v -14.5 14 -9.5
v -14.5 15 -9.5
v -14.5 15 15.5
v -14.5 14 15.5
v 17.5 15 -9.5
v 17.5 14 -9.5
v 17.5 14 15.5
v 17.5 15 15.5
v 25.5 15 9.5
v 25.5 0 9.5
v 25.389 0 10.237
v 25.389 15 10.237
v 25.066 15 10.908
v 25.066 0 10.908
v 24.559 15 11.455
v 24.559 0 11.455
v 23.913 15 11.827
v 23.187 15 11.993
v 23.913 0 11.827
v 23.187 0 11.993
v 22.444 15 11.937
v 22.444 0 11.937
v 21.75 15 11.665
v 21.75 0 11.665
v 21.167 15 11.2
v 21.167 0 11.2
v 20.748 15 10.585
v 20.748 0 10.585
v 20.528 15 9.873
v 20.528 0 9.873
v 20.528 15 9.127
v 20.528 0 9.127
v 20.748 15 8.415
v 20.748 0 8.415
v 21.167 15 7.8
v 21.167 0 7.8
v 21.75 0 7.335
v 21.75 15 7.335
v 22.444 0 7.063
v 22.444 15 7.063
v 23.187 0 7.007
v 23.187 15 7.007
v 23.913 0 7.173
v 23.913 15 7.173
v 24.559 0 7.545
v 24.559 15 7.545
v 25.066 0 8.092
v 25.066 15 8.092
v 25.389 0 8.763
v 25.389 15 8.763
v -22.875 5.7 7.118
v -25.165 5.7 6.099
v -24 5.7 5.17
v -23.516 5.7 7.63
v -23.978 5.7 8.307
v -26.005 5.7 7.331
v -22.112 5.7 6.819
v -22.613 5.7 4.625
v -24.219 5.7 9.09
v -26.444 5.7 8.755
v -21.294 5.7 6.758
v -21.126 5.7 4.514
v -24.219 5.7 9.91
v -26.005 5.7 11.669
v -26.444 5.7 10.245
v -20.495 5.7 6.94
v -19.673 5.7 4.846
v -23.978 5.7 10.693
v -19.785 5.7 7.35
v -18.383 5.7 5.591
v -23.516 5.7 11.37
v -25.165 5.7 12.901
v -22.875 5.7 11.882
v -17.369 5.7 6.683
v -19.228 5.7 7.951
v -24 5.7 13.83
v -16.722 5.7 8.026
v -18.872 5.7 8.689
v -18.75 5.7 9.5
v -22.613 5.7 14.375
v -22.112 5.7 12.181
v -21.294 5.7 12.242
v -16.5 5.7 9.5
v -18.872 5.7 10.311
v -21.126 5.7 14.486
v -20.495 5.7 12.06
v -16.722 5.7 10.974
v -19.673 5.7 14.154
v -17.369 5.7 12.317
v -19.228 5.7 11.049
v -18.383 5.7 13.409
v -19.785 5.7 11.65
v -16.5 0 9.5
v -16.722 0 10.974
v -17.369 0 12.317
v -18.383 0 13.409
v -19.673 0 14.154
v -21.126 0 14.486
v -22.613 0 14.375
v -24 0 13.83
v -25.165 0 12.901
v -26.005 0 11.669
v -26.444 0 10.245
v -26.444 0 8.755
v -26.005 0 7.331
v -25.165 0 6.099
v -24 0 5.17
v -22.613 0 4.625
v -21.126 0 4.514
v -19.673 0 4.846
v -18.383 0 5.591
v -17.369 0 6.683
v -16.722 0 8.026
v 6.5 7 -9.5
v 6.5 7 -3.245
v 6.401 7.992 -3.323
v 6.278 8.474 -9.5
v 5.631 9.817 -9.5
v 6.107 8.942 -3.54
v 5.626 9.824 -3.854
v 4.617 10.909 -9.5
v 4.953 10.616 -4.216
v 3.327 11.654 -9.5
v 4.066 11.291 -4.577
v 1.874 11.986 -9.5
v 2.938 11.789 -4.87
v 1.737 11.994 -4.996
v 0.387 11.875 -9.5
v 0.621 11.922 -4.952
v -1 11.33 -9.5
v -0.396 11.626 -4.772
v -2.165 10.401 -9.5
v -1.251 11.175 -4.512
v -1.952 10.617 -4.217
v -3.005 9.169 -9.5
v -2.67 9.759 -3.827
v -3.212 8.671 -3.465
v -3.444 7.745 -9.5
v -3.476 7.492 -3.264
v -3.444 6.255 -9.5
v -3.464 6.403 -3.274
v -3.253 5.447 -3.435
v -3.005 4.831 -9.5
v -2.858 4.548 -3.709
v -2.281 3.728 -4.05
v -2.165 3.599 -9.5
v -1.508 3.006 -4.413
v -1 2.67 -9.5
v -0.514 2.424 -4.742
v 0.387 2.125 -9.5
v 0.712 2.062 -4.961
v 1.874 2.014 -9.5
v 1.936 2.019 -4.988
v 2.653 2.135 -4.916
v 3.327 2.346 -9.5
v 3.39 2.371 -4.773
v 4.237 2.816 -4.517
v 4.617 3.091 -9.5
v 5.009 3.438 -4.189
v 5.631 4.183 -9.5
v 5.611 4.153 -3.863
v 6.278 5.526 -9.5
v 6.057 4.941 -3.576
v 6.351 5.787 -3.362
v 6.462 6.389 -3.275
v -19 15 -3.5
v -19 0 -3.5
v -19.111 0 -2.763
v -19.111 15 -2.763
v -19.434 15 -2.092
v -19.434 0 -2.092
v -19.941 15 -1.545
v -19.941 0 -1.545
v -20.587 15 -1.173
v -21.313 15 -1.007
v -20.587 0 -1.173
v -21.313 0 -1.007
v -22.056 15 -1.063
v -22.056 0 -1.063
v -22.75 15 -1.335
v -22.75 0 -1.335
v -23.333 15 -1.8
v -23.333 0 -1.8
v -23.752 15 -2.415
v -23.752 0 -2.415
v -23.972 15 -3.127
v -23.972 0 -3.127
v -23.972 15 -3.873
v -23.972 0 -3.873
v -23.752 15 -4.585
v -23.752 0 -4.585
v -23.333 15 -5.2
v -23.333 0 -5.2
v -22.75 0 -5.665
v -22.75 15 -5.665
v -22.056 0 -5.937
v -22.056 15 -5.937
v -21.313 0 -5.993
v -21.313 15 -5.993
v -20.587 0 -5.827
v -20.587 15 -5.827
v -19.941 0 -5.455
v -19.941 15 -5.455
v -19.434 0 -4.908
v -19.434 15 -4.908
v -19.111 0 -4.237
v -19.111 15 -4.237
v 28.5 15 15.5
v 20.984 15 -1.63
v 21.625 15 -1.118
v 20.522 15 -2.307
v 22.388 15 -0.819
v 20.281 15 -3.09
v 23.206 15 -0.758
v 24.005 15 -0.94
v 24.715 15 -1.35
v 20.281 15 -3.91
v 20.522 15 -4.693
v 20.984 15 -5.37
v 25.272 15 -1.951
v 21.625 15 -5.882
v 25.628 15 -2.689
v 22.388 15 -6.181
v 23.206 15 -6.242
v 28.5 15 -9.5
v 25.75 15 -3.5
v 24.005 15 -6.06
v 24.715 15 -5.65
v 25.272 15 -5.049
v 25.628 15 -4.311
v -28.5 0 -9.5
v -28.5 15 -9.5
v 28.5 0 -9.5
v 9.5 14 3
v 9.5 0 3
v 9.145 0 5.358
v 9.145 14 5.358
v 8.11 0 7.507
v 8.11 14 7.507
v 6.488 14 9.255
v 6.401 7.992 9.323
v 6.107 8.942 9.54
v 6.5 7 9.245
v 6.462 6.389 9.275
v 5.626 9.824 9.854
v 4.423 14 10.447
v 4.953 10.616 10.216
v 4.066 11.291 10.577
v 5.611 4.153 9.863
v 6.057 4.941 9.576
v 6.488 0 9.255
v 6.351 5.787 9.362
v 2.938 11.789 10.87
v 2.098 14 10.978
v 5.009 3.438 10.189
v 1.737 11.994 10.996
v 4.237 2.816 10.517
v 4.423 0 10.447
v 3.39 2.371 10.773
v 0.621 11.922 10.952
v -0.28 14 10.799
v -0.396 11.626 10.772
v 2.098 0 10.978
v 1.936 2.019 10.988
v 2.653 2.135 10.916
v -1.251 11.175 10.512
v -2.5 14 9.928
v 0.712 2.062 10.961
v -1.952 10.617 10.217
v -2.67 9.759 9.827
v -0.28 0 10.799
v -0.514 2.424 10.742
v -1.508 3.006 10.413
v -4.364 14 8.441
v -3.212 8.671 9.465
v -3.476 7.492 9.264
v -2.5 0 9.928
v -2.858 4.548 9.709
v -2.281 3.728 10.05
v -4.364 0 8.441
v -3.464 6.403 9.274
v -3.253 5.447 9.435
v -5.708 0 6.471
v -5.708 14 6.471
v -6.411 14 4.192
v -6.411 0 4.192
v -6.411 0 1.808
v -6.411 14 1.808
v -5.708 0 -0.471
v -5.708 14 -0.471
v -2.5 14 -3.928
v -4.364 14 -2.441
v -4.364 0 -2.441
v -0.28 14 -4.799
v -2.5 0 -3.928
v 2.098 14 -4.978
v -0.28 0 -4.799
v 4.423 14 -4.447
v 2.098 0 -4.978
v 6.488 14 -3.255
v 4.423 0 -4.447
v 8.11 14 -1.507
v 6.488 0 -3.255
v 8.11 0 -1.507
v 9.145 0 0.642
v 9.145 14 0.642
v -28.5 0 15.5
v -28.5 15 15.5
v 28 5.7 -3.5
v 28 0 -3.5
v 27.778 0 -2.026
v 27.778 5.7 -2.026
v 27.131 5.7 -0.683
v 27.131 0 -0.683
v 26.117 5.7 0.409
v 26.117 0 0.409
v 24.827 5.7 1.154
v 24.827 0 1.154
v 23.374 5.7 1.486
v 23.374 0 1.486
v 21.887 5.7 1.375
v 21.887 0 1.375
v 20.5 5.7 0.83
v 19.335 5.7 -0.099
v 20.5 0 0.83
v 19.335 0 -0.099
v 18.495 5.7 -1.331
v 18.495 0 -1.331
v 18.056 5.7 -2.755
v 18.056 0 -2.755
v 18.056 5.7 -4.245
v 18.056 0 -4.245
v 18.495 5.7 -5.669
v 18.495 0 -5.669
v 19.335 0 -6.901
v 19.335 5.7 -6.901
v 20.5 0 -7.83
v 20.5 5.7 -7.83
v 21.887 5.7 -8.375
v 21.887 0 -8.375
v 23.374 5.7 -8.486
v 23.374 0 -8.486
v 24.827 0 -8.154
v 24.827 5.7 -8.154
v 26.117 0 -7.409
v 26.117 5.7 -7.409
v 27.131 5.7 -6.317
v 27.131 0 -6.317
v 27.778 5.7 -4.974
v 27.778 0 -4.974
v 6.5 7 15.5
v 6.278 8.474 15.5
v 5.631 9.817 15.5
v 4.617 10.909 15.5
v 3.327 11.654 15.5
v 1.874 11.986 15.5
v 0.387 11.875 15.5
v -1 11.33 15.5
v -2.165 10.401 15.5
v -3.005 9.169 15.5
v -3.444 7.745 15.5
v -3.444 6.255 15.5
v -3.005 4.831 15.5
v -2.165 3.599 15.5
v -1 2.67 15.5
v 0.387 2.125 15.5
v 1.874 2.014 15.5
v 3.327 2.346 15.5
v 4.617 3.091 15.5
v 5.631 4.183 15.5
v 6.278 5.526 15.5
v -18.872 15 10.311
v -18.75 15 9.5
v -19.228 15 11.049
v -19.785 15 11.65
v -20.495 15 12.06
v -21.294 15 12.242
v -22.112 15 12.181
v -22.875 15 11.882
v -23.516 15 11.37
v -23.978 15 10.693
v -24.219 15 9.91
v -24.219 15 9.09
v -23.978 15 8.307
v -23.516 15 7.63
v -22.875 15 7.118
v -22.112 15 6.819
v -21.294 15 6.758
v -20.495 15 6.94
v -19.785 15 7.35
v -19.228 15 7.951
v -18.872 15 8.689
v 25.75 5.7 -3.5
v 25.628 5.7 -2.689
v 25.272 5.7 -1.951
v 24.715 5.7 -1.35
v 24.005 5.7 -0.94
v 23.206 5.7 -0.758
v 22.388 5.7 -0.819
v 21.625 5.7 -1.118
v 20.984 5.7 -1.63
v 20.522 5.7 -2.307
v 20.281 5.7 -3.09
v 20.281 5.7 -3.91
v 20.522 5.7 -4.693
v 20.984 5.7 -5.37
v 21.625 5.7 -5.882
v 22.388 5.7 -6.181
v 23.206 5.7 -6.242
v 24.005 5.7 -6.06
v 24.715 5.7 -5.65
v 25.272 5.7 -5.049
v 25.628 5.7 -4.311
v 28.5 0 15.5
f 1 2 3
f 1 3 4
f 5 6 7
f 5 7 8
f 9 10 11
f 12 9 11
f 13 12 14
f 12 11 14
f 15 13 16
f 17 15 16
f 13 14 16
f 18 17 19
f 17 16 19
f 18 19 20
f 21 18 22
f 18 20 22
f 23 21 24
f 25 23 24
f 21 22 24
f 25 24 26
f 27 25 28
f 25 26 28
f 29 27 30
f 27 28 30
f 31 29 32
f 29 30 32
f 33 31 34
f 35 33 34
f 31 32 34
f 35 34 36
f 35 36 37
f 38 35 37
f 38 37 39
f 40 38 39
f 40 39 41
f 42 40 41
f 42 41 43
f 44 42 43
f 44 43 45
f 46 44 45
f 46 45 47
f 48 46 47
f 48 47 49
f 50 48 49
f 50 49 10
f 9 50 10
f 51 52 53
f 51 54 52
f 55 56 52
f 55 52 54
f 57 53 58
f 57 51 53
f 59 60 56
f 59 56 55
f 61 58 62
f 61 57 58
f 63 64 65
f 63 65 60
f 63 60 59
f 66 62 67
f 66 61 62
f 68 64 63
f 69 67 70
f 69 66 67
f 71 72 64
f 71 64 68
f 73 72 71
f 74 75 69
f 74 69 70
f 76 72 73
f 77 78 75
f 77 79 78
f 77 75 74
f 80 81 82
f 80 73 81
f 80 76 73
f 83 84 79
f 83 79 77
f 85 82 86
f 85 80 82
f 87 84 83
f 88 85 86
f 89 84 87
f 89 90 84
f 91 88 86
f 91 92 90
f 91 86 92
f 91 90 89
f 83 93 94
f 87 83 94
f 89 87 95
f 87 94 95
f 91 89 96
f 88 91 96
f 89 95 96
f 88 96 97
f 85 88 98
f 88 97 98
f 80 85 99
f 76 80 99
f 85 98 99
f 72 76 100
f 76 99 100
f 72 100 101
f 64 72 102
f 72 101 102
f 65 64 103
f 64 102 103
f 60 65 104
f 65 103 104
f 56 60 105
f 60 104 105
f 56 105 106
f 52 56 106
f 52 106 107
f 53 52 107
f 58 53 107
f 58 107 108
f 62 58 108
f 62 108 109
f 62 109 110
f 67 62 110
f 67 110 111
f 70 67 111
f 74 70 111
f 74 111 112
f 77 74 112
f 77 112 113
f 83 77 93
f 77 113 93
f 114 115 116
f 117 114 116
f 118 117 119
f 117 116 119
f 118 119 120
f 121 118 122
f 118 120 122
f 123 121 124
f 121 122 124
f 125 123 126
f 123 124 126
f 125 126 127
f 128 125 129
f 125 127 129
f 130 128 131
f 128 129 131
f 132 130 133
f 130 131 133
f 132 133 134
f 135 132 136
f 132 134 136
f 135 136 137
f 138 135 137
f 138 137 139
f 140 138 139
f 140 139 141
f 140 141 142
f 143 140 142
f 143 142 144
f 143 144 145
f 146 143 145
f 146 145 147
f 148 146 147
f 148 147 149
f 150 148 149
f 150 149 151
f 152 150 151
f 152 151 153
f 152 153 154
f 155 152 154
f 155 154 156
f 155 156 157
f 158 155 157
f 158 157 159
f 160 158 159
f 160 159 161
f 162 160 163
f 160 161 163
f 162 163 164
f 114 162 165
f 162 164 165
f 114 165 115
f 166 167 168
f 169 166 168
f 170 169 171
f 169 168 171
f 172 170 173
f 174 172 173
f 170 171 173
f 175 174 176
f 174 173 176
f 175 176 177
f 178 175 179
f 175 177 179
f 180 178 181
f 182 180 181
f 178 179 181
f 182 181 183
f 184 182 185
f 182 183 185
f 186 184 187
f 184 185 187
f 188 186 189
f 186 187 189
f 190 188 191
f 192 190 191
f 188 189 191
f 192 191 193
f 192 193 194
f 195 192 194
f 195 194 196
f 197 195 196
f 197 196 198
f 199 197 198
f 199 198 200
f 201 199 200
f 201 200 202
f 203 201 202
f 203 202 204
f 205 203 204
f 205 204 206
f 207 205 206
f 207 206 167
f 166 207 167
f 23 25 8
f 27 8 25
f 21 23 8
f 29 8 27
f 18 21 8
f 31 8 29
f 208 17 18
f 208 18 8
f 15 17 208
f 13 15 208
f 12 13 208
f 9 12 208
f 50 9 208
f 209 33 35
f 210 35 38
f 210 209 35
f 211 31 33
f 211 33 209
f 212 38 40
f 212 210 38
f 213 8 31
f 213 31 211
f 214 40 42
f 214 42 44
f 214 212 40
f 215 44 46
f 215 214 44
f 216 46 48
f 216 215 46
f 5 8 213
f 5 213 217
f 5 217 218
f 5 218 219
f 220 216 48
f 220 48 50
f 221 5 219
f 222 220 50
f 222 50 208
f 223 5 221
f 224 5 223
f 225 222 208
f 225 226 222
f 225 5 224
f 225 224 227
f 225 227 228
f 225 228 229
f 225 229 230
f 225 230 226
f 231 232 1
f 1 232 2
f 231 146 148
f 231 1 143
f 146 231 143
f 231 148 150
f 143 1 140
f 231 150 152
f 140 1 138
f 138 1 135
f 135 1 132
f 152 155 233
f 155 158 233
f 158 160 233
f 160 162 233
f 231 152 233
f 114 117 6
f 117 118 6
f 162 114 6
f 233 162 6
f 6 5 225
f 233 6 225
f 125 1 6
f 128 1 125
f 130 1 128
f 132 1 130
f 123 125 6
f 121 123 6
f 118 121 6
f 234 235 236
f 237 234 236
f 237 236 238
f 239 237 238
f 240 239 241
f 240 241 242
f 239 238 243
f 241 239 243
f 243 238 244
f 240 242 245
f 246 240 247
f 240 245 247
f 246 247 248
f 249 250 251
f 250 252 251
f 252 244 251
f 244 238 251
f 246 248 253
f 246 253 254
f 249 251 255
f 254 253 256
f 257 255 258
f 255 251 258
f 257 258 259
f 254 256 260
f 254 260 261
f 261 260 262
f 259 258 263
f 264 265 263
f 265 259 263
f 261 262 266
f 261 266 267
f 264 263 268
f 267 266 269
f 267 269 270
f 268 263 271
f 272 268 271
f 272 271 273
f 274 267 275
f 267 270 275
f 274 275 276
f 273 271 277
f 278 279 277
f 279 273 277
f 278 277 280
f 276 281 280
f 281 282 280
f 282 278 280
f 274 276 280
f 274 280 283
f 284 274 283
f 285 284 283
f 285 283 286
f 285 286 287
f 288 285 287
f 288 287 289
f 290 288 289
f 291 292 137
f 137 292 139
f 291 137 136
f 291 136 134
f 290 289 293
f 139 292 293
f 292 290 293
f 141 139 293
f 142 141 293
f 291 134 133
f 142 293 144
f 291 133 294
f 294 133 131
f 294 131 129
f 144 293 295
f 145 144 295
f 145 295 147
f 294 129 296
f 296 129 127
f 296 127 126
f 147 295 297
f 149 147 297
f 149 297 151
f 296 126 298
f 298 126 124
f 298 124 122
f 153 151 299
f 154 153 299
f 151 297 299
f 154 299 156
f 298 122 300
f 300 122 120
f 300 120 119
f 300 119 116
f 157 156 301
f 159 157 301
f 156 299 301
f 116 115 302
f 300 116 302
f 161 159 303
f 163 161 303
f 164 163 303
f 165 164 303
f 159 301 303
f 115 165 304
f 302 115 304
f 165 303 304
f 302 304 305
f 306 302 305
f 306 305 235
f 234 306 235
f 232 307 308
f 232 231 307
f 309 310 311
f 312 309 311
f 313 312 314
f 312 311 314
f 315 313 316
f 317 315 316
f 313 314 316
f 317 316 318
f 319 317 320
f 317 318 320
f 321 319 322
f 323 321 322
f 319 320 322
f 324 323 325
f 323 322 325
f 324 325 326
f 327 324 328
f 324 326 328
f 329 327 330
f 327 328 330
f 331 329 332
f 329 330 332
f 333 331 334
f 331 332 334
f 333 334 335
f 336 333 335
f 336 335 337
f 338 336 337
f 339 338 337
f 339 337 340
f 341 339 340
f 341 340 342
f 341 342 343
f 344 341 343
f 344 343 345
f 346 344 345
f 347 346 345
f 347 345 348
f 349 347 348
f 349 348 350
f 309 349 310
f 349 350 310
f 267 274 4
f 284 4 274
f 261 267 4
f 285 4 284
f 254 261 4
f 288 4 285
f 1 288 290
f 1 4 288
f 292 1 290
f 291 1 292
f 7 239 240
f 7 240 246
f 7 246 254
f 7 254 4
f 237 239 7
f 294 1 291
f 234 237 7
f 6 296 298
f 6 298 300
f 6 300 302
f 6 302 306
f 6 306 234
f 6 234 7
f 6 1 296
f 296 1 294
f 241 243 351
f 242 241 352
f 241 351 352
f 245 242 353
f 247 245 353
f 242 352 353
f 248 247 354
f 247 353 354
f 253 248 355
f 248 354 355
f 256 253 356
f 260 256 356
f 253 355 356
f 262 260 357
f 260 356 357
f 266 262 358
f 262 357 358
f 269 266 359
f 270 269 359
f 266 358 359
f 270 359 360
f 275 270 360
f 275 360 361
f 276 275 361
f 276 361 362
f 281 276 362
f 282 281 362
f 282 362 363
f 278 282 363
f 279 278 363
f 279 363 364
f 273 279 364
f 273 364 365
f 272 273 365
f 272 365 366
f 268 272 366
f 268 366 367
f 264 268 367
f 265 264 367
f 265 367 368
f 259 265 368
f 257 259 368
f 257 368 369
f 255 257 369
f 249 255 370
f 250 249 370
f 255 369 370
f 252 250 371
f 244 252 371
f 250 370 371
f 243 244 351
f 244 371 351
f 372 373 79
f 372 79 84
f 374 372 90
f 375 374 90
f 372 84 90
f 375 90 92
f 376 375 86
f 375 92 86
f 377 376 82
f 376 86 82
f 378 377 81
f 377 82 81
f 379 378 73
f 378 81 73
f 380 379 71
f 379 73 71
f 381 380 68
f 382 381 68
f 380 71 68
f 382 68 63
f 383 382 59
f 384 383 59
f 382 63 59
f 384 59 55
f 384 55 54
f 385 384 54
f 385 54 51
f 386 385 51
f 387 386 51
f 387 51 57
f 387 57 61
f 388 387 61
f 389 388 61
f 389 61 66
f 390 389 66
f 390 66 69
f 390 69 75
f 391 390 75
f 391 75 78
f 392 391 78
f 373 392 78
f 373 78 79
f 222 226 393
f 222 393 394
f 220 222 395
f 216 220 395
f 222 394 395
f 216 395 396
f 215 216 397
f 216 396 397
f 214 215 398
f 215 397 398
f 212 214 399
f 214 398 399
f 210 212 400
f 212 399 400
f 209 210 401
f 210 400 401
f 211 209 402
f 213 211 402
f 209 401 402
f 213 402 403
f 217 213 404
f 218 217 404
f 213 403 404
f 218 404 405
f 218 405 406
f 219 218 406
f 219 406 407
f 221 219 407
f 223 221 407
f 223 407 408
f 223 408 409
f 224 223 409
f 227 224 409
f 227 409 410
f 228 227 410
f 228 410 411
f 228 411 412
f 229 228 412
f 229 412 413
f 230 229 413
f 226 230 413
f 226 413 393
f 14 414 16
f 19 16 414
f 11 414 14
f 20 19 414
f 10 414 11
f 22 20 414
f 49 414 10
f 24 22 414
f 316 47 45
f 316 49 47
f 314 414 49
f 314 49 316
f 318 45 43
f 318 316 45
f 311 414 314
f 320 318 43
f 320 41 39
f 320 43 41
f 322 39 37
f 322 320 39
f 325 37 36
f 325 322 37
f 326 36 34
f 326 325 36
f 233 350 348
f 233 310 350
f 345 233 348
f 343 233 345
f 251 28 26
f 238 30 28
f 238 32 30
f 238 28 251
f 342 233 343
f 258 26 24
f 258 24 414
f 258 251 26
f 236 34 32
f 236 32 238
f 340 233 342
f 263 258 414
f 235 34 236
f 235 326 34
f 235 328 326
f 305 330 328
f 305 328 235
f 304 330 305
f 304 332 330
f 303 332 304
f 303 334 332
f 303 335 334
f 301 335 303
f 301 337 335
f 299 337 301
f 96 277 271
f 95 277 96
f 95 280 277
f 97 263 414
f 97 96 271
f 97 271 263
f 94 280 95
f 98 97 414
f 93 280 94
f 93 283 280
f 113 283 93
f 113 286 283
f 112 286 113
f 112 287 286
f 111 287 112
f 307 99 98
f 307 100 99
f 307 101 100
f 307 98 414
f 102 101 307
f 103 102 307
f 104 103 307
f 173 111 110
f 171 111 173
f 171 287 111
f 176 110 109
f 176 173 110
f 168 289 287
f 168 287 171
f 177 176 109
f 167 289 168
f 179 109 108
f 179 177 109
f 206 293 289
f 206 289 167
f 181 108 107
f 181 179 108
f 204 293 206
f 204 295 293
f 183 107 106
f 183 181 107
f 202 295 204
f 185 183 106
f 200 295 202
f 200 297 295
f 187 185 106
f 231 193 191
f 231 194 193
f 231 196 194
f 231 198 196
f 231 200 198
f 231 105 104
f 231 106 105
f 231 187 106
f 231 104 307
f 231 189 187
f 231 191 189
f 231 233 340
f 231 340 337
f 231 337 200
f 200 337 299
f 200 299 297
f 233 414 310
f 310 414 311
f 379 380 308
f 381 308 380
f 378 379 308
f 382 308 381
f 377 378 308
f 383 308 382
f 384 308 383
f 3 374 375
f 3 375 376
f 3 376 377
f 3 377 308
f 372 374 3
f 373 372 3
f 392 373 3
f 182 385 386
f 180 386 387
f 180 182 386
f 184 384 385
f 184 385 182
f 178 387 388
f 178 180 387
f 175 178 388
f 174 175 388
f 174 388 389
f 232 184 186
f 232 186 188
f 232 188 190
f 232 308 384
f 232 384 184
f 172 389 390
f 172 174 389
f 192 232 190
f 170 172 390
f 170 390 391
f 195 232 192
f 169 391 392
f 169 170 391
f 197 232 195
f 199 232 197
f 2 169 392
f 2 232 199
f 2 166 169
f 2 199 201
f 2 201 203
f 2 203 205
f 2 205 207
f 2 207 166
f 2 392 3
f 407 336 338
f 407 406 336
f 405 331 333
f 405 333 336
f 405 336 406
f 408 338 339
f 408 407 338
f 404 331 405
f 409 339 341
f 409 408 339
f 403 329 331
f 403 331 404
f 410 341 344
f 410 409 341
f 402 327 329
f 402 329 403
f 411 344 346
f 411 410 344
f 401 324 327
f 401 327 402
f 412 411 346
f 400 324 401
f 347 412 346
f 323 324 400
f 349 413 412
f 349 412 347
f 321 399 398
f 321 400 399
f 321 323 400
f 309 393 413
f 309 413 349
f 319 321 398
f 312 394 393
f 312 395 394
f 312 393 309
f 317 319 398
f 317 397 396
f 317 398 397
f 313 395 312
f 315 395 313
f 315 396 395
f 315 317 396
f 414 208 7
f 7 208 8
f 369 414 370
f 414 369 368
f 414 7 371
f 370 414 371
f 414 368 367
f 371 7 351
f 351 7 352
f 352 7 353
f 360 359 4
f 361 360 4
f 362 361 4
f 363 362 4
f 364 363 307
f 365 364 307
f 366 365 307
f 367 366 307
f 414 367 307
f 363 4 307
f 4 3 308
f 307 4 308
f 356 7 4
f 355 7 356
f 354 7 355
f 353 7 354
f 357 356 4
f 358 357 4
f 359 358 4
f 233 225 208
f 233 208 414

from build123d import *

# Parameters (mm, degrees)
SKETCH1_W           = 57
SKETCH1_H           = 19
BOSS_EXTRUDE1_DEPTH = 15
SKETCH2_W           = 32
SKETCH2_H           = 1
CUT_EXTRUDE1_DEPTH  = 22
SKETCH3_R           = 5
CUT_EXTRUDE2_DEPTH  = 22
BOSS_EXTRUDE2_DEPTH = 6
SKETCH6_R           = 2.75
SKETCH6_R_2         = 2.5
CUT_EXTRUDE5_DEPTH  = 58.7
SKETCH8_R           = 5
CUT_EXTRUDE6_DEPTH  = 5.7
SKETCH9_R           = 8
CUT_EXTRUDE7_DEPTH  = 15.7
SKETCH10_R          = 5
CUT_EXTRUDE8_DEPTH  = 56.7
SKETCH11_R          = 8
BOSS_EXTRUDE3_DEPTH = 14
SKETCH12_R          = 5
BOSS_EXTRUDE4_DEPTH = 25
SKETCH13_R          = 8
CUT_EXTRUDE9_DEPTH  = 171
SKETCH14_R          = 5
CUT_EXTRUDE10_DEPTH = 171


with BuildPart() as part:
    # Sketch1 → Boss-Extrude1 (new body)
    with BuildSketch(Plane(origin=(0, 0, 0), x_dir=(1, 0, 0), z_dir=(0, 1, 0))):
        Rectangle(SKETCH1_W, SKETCH1_H)
    extrude(amount=BOSS_EXTRUDE1_DEPTH)

    # Sketch2 → Cut-Extrude1 (cut)
    with BuildSketch(Plane.XY.offset(9.5)):
        with Locations((1.5, 14.5)):
            Rectangle(SKETCH2_W, SKETCH2_H)
    extrude(amount=-CUT_EXTRUDE1_DEPTH, mode=Mode.SUBTRACT)

    # Sketch3 → Cut-Extrude2 (cut)
    with BuildSketch(Plane.XY.offset(9.5)):
        with Locations((0, 7)):
            Circle(SKETCH3_R)
    extrude(amount=-CUT_EXTRUDE2_DEPTH, mode=Mode.SUBTRACT)

    # Sketch5 → Boss-Extrude2 (add)
    with BuildSketch(Plane.XY.offset(9.5)):
        Polygon((-28.5, 15), (-14.5, 15), (-14.5, 14), (17.5, 14), (17.5, 15), (28.5, 15), (28.5, 0), (-28.5, 0), align=None)
    extrude(amount=BOSS_EXTRUDE2_DEPTH)

    # Sketch6 → Cut-Extrude5 (cut)
    with BuildSketch(Plane.XZ):
        with Locations((-21.5, 9.5)):
            Circle(SKETCH6_R)
        with Locations((23, -3.5)):
            Circle(SKETCH6_R)
        with Locations((-21.5, -3.5)):
            Circle(SKETCH6_R_2)
        with Locations((23, 9.5)):
            Circle(SKETCH6_R_2)
    extrude(amount=-CUT_EXTRUDE5_DEPTH, mode=Mode.SUBTRACT)

    # Sketch8 → Cut-Extrude6 (cut)
    with BuildSketch(Plane.XZ):
        with Locations((-21.5, 9.5)):
            Circle(SKETCH8_R)
        with Locations((23, -3.5)):
            Circle(SKETCH8_R)
    extrude(amount=-CUT_EXTRUDE6_DEPTH, mode=Mode.SUBTRACT)

    # Sketch9 → Cut-Extrude7 (cut)
    with BuildSketch(Plane.XZ):
        with Locations((0, 3)):
            Circle(SKETCH9_R)
    extrude(amount=-CUT_EXTRUDE7_DEPTH, mode=Mode.SUBTRACT)

    # Sketch10 → Cut-Extrude8 (cut)
    with BuildSketch(Plane(origin=(0, 0, -9.5), x_dir=(-1, 0, 0), z_dir=(0, 0, -1))):
        with Locations((0, 7)):
            Circle(SKETCH10_R)
    extrude(amount=-CUT_EXTRUDE8_DEPTH, mode=Mode.SUBTRACT)

    # Sketch11 → Boss-Extrude3 (add)
    with BuildSketch(Plane.XZ):
        with Locations((0, 3)):
            Circle(SKETCH11_R)
    extrude(amount=-BOSS_EXTRUDE3_DEPTH)

    # Sketch12 → Boss-Extrude4 (add)
    with BuildSketch(Plane.XY.offset(15.5)):
        with Locations((0, 7)):
            Circle(SKETCH12_R)
    extrude(amount=-BOSS_EXTRUDE4_DEPTH)

    # Sketch13 → Cut-Extrude9 (cut)
    with BuildSketch(Plane.XZ):
        with Locations((1.5, 3)):
            Circle(SKETCH13_R)
    extrude(amount=-CUT_EXTRUDE9_DEPTH, mode=Mode.SUBTRACT)

    # Sketch14 → Cut-Extrude10 (cut)
    with BuildSketch(Plane.XY.offset(15.5)):
        with Locations((1.5, 7)):
            Circle(SKETCH14_R)
    extrude(amount=-CUT_EXTRUDE10_DEPTH, mode=Mode.SUBTRACT)


solid = part.part
